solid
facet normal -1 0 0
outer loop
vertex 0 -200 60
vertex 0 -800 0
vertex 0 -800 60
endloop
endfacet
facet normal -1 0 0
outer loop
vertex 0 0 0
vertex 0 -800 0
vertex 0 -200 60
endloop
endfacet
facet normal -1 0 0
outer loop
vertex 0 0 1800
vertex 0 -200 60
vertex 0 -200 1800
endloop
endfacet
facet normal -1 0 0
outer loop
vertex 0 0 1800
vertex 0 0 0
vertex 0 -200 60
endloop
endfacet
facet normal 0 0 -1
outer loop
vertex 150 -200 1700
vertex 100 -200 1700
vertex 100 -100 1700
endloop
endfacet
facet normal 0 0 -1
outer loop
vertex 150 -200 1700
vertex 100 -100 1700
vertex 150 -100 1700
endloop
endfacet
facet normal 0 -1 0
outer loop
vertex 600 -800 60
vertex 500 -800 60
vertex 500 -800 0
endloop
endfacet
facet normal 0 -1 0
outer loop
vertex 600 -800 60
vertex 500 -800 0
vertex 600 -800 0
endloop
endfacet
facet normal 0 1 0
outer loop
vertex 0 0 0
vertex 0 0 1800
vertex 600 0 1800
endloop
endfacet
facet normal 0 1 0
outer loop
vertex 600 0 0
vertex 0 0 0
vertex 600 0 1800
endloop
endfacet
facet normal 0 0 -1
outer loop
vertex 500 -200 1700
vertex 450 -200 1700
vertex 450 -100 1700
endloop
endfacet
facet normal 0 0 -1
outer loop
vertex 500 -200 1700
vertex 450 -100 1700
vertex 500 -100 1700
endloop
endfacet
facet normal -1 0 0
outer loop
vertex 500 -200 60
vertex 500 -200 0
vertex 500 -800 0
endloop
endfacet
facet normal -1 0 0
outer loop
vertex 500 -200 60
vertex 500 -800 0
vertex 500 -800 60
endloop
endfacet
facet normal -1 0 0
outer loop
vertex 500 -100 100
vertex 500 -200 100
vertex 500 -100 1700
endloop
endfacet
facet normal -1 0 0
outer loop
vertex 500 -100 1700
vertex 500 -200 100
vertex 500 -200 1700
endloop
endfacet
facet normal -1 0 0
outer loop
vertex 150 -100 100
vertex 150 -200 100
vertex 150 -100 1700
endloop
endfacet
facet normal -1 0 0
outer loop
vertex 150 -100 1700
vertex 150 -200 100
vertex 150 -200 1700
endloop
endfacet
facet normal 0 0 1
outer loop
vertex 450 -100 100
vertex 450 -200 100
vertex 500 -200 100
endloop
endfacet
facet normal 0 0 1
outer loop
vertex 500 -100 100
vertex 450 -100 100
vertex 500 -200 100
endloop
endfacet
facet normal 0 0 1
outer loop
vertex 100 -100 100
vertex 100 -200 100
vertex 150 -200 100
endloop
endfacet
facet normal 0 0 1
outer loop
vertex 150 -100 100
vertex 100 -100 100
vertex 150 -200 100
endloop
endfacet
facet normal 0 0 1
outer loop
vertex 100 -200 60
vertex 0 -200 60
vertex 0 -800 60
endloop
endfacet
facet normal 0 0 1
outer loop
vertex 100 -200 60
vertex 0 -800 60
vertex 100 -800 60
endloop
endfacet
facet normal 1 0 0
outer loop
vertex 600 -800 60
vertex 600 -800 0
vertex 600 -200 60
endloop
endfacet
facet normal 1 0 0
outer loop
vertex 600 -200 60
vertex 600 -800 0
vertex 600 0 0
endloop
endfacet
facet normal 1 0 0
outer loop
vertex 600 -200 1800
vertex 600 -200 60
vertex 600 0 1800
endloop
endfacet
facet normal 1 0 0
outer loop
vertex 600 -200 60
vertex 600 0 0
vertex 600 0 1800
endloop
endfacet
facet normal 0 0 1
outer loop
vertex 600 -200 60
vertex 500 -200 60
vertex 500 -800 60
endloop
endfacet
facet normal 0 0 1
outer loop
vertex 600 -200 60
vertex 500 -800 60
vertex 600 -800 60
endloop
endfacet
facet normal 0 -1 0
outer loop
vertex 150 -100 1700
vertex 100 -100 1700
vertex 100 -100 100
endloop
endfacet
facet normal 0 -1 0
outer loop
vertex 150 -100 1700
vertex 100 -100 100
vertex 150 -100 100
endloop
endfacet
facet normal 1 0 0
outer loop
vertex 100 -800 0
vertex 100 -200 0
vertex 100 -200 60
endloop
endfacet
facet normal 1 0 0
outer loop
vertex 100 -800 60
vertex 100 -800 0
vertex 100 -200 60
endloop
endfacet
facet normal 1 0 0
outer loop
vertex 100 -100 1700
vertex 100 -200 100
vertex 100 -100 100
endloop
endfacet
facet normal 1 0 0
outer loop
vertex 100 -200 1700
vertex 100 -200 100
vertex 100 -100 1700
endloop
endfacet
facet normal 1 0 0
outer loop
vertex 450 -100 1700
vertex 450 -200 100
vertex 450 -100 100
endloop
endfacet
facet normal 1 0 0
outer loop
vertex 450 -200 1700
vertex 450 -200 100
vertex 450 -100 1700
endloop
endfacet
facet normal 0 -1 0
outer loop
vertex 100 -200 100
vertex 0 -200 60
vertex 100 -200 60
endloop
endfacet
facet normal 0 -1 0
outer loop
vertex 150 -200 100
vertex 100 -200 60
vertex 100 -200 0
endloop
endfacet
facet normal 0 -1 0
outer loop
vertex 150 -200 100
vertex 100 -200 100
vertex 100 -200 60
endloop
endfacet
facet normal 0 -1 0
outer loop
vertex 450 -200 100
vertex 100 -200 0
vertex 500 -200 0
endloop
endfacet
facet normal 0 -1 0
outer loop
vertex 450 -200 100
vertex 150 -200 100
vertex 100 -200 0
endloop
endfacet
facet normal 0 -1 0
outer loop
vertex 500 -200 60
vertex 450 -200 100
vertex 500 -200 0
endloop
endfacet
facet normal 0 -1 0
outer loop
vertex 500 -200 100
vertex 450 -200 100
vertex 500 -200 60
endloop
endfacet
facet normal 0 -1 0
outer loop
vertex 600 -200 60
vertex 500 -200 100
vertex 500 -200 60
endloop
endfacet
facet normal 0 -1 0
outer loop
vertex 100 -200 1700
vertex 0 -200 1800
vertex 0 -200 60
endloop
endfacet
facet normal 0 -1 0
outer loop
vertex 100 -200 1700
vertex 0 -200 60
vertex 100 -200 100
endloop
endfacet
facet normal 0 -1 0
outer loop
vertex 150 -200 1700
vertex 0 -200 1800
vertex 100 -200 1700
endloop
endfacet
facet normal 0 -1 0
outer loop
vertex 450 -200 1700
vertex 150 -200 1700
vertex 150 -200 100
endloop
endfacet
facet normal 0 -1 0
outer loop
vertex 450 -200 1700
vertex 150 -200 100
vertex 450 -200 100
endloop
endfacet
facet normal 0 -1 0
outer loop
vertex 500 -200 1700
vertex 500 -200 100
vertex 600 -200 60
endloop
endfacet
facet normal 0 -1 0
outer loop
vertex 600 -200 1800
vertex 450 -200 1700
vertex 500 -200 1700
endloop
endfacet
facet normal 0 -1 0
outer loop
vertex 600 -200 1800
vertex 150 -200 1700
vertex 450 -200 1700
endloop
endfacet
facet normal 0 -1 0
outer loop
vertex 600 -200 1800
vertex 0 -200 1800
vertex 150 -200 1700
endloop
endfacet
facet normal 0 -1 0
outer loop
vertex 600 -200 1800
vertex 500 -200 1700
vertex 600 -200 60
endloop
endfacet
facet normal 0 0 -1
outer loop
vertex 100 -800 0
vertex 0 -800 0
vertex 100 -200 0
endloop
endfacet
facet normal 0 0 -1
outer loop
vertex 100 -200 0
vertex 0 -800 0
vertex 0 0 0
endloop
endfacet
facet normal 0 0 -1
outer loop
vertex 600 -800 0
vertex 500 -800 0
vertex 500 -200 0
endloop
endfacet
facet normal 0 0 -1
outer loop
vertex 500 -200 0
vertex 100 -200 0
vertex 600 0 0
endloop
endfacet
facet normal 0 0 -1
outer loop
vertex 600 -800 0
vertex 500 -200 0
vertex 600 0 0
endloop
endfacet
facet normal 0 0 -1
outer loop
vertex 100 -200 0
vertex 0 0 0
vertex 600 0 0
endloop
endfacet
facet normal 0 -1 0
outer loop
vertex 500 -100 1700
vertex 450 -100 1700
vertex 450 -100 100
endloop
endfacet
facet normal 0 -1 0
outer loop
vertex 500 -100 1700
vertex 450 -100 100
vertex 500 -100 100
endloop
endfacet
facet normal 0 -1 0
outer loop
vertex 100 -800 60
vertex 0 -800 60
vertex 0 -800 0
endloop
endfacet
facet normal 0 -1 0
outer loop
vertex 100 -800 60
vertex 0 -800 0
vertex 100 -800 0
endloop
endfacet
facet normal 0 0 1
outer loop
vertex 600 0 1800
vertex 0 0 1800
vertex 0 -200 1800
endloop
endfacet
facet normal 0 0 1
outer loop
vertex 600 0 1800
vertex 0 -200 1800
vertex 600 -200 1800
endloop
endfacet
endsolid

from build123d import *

# Parameters (mm, degrees)
F0_W     = 600
F0_H     = 1800
F1_DEPTH = 200
F2_W     = 100
F2_H     = 60
F3_DEPTH = 600
F4_W     = 50
F4_H     = 1600
F5_DEPTH = 100


with BuildPart() as f1:
    # F0 (on Front) → F1 (new body)
    with BuildSketch(Plane.XZ):
        with Locations((300, 900)):
            Rectangle(F0_W, F0_H)
    extrude(amount=F1_DEPTH)

    # F2 (on face) → F3 (join)
    with BuildSketch(Plane.XZ.offset(200)):
        with Locations((50, 30)):
            Rectangle(F2_W, F2_H)
        with Locations((550, 30)):
            Rectangle(F2_W, F2_H)
    extrude(amount=F3_DEPTH)

    # F4 (on face) → F5 (cut)
    with BuildSketch(Plane.XZ.offset(200)):
        with Locations((125, 900)):
            Rectangle(F4_W, F4_H)
        with Locations((475, 900)):
            Rectangle(F4_W, F4_H)
    extrude(amount=-F5_DEPTH, mode=Mode.SUBTRACT)


solid = f1.part
